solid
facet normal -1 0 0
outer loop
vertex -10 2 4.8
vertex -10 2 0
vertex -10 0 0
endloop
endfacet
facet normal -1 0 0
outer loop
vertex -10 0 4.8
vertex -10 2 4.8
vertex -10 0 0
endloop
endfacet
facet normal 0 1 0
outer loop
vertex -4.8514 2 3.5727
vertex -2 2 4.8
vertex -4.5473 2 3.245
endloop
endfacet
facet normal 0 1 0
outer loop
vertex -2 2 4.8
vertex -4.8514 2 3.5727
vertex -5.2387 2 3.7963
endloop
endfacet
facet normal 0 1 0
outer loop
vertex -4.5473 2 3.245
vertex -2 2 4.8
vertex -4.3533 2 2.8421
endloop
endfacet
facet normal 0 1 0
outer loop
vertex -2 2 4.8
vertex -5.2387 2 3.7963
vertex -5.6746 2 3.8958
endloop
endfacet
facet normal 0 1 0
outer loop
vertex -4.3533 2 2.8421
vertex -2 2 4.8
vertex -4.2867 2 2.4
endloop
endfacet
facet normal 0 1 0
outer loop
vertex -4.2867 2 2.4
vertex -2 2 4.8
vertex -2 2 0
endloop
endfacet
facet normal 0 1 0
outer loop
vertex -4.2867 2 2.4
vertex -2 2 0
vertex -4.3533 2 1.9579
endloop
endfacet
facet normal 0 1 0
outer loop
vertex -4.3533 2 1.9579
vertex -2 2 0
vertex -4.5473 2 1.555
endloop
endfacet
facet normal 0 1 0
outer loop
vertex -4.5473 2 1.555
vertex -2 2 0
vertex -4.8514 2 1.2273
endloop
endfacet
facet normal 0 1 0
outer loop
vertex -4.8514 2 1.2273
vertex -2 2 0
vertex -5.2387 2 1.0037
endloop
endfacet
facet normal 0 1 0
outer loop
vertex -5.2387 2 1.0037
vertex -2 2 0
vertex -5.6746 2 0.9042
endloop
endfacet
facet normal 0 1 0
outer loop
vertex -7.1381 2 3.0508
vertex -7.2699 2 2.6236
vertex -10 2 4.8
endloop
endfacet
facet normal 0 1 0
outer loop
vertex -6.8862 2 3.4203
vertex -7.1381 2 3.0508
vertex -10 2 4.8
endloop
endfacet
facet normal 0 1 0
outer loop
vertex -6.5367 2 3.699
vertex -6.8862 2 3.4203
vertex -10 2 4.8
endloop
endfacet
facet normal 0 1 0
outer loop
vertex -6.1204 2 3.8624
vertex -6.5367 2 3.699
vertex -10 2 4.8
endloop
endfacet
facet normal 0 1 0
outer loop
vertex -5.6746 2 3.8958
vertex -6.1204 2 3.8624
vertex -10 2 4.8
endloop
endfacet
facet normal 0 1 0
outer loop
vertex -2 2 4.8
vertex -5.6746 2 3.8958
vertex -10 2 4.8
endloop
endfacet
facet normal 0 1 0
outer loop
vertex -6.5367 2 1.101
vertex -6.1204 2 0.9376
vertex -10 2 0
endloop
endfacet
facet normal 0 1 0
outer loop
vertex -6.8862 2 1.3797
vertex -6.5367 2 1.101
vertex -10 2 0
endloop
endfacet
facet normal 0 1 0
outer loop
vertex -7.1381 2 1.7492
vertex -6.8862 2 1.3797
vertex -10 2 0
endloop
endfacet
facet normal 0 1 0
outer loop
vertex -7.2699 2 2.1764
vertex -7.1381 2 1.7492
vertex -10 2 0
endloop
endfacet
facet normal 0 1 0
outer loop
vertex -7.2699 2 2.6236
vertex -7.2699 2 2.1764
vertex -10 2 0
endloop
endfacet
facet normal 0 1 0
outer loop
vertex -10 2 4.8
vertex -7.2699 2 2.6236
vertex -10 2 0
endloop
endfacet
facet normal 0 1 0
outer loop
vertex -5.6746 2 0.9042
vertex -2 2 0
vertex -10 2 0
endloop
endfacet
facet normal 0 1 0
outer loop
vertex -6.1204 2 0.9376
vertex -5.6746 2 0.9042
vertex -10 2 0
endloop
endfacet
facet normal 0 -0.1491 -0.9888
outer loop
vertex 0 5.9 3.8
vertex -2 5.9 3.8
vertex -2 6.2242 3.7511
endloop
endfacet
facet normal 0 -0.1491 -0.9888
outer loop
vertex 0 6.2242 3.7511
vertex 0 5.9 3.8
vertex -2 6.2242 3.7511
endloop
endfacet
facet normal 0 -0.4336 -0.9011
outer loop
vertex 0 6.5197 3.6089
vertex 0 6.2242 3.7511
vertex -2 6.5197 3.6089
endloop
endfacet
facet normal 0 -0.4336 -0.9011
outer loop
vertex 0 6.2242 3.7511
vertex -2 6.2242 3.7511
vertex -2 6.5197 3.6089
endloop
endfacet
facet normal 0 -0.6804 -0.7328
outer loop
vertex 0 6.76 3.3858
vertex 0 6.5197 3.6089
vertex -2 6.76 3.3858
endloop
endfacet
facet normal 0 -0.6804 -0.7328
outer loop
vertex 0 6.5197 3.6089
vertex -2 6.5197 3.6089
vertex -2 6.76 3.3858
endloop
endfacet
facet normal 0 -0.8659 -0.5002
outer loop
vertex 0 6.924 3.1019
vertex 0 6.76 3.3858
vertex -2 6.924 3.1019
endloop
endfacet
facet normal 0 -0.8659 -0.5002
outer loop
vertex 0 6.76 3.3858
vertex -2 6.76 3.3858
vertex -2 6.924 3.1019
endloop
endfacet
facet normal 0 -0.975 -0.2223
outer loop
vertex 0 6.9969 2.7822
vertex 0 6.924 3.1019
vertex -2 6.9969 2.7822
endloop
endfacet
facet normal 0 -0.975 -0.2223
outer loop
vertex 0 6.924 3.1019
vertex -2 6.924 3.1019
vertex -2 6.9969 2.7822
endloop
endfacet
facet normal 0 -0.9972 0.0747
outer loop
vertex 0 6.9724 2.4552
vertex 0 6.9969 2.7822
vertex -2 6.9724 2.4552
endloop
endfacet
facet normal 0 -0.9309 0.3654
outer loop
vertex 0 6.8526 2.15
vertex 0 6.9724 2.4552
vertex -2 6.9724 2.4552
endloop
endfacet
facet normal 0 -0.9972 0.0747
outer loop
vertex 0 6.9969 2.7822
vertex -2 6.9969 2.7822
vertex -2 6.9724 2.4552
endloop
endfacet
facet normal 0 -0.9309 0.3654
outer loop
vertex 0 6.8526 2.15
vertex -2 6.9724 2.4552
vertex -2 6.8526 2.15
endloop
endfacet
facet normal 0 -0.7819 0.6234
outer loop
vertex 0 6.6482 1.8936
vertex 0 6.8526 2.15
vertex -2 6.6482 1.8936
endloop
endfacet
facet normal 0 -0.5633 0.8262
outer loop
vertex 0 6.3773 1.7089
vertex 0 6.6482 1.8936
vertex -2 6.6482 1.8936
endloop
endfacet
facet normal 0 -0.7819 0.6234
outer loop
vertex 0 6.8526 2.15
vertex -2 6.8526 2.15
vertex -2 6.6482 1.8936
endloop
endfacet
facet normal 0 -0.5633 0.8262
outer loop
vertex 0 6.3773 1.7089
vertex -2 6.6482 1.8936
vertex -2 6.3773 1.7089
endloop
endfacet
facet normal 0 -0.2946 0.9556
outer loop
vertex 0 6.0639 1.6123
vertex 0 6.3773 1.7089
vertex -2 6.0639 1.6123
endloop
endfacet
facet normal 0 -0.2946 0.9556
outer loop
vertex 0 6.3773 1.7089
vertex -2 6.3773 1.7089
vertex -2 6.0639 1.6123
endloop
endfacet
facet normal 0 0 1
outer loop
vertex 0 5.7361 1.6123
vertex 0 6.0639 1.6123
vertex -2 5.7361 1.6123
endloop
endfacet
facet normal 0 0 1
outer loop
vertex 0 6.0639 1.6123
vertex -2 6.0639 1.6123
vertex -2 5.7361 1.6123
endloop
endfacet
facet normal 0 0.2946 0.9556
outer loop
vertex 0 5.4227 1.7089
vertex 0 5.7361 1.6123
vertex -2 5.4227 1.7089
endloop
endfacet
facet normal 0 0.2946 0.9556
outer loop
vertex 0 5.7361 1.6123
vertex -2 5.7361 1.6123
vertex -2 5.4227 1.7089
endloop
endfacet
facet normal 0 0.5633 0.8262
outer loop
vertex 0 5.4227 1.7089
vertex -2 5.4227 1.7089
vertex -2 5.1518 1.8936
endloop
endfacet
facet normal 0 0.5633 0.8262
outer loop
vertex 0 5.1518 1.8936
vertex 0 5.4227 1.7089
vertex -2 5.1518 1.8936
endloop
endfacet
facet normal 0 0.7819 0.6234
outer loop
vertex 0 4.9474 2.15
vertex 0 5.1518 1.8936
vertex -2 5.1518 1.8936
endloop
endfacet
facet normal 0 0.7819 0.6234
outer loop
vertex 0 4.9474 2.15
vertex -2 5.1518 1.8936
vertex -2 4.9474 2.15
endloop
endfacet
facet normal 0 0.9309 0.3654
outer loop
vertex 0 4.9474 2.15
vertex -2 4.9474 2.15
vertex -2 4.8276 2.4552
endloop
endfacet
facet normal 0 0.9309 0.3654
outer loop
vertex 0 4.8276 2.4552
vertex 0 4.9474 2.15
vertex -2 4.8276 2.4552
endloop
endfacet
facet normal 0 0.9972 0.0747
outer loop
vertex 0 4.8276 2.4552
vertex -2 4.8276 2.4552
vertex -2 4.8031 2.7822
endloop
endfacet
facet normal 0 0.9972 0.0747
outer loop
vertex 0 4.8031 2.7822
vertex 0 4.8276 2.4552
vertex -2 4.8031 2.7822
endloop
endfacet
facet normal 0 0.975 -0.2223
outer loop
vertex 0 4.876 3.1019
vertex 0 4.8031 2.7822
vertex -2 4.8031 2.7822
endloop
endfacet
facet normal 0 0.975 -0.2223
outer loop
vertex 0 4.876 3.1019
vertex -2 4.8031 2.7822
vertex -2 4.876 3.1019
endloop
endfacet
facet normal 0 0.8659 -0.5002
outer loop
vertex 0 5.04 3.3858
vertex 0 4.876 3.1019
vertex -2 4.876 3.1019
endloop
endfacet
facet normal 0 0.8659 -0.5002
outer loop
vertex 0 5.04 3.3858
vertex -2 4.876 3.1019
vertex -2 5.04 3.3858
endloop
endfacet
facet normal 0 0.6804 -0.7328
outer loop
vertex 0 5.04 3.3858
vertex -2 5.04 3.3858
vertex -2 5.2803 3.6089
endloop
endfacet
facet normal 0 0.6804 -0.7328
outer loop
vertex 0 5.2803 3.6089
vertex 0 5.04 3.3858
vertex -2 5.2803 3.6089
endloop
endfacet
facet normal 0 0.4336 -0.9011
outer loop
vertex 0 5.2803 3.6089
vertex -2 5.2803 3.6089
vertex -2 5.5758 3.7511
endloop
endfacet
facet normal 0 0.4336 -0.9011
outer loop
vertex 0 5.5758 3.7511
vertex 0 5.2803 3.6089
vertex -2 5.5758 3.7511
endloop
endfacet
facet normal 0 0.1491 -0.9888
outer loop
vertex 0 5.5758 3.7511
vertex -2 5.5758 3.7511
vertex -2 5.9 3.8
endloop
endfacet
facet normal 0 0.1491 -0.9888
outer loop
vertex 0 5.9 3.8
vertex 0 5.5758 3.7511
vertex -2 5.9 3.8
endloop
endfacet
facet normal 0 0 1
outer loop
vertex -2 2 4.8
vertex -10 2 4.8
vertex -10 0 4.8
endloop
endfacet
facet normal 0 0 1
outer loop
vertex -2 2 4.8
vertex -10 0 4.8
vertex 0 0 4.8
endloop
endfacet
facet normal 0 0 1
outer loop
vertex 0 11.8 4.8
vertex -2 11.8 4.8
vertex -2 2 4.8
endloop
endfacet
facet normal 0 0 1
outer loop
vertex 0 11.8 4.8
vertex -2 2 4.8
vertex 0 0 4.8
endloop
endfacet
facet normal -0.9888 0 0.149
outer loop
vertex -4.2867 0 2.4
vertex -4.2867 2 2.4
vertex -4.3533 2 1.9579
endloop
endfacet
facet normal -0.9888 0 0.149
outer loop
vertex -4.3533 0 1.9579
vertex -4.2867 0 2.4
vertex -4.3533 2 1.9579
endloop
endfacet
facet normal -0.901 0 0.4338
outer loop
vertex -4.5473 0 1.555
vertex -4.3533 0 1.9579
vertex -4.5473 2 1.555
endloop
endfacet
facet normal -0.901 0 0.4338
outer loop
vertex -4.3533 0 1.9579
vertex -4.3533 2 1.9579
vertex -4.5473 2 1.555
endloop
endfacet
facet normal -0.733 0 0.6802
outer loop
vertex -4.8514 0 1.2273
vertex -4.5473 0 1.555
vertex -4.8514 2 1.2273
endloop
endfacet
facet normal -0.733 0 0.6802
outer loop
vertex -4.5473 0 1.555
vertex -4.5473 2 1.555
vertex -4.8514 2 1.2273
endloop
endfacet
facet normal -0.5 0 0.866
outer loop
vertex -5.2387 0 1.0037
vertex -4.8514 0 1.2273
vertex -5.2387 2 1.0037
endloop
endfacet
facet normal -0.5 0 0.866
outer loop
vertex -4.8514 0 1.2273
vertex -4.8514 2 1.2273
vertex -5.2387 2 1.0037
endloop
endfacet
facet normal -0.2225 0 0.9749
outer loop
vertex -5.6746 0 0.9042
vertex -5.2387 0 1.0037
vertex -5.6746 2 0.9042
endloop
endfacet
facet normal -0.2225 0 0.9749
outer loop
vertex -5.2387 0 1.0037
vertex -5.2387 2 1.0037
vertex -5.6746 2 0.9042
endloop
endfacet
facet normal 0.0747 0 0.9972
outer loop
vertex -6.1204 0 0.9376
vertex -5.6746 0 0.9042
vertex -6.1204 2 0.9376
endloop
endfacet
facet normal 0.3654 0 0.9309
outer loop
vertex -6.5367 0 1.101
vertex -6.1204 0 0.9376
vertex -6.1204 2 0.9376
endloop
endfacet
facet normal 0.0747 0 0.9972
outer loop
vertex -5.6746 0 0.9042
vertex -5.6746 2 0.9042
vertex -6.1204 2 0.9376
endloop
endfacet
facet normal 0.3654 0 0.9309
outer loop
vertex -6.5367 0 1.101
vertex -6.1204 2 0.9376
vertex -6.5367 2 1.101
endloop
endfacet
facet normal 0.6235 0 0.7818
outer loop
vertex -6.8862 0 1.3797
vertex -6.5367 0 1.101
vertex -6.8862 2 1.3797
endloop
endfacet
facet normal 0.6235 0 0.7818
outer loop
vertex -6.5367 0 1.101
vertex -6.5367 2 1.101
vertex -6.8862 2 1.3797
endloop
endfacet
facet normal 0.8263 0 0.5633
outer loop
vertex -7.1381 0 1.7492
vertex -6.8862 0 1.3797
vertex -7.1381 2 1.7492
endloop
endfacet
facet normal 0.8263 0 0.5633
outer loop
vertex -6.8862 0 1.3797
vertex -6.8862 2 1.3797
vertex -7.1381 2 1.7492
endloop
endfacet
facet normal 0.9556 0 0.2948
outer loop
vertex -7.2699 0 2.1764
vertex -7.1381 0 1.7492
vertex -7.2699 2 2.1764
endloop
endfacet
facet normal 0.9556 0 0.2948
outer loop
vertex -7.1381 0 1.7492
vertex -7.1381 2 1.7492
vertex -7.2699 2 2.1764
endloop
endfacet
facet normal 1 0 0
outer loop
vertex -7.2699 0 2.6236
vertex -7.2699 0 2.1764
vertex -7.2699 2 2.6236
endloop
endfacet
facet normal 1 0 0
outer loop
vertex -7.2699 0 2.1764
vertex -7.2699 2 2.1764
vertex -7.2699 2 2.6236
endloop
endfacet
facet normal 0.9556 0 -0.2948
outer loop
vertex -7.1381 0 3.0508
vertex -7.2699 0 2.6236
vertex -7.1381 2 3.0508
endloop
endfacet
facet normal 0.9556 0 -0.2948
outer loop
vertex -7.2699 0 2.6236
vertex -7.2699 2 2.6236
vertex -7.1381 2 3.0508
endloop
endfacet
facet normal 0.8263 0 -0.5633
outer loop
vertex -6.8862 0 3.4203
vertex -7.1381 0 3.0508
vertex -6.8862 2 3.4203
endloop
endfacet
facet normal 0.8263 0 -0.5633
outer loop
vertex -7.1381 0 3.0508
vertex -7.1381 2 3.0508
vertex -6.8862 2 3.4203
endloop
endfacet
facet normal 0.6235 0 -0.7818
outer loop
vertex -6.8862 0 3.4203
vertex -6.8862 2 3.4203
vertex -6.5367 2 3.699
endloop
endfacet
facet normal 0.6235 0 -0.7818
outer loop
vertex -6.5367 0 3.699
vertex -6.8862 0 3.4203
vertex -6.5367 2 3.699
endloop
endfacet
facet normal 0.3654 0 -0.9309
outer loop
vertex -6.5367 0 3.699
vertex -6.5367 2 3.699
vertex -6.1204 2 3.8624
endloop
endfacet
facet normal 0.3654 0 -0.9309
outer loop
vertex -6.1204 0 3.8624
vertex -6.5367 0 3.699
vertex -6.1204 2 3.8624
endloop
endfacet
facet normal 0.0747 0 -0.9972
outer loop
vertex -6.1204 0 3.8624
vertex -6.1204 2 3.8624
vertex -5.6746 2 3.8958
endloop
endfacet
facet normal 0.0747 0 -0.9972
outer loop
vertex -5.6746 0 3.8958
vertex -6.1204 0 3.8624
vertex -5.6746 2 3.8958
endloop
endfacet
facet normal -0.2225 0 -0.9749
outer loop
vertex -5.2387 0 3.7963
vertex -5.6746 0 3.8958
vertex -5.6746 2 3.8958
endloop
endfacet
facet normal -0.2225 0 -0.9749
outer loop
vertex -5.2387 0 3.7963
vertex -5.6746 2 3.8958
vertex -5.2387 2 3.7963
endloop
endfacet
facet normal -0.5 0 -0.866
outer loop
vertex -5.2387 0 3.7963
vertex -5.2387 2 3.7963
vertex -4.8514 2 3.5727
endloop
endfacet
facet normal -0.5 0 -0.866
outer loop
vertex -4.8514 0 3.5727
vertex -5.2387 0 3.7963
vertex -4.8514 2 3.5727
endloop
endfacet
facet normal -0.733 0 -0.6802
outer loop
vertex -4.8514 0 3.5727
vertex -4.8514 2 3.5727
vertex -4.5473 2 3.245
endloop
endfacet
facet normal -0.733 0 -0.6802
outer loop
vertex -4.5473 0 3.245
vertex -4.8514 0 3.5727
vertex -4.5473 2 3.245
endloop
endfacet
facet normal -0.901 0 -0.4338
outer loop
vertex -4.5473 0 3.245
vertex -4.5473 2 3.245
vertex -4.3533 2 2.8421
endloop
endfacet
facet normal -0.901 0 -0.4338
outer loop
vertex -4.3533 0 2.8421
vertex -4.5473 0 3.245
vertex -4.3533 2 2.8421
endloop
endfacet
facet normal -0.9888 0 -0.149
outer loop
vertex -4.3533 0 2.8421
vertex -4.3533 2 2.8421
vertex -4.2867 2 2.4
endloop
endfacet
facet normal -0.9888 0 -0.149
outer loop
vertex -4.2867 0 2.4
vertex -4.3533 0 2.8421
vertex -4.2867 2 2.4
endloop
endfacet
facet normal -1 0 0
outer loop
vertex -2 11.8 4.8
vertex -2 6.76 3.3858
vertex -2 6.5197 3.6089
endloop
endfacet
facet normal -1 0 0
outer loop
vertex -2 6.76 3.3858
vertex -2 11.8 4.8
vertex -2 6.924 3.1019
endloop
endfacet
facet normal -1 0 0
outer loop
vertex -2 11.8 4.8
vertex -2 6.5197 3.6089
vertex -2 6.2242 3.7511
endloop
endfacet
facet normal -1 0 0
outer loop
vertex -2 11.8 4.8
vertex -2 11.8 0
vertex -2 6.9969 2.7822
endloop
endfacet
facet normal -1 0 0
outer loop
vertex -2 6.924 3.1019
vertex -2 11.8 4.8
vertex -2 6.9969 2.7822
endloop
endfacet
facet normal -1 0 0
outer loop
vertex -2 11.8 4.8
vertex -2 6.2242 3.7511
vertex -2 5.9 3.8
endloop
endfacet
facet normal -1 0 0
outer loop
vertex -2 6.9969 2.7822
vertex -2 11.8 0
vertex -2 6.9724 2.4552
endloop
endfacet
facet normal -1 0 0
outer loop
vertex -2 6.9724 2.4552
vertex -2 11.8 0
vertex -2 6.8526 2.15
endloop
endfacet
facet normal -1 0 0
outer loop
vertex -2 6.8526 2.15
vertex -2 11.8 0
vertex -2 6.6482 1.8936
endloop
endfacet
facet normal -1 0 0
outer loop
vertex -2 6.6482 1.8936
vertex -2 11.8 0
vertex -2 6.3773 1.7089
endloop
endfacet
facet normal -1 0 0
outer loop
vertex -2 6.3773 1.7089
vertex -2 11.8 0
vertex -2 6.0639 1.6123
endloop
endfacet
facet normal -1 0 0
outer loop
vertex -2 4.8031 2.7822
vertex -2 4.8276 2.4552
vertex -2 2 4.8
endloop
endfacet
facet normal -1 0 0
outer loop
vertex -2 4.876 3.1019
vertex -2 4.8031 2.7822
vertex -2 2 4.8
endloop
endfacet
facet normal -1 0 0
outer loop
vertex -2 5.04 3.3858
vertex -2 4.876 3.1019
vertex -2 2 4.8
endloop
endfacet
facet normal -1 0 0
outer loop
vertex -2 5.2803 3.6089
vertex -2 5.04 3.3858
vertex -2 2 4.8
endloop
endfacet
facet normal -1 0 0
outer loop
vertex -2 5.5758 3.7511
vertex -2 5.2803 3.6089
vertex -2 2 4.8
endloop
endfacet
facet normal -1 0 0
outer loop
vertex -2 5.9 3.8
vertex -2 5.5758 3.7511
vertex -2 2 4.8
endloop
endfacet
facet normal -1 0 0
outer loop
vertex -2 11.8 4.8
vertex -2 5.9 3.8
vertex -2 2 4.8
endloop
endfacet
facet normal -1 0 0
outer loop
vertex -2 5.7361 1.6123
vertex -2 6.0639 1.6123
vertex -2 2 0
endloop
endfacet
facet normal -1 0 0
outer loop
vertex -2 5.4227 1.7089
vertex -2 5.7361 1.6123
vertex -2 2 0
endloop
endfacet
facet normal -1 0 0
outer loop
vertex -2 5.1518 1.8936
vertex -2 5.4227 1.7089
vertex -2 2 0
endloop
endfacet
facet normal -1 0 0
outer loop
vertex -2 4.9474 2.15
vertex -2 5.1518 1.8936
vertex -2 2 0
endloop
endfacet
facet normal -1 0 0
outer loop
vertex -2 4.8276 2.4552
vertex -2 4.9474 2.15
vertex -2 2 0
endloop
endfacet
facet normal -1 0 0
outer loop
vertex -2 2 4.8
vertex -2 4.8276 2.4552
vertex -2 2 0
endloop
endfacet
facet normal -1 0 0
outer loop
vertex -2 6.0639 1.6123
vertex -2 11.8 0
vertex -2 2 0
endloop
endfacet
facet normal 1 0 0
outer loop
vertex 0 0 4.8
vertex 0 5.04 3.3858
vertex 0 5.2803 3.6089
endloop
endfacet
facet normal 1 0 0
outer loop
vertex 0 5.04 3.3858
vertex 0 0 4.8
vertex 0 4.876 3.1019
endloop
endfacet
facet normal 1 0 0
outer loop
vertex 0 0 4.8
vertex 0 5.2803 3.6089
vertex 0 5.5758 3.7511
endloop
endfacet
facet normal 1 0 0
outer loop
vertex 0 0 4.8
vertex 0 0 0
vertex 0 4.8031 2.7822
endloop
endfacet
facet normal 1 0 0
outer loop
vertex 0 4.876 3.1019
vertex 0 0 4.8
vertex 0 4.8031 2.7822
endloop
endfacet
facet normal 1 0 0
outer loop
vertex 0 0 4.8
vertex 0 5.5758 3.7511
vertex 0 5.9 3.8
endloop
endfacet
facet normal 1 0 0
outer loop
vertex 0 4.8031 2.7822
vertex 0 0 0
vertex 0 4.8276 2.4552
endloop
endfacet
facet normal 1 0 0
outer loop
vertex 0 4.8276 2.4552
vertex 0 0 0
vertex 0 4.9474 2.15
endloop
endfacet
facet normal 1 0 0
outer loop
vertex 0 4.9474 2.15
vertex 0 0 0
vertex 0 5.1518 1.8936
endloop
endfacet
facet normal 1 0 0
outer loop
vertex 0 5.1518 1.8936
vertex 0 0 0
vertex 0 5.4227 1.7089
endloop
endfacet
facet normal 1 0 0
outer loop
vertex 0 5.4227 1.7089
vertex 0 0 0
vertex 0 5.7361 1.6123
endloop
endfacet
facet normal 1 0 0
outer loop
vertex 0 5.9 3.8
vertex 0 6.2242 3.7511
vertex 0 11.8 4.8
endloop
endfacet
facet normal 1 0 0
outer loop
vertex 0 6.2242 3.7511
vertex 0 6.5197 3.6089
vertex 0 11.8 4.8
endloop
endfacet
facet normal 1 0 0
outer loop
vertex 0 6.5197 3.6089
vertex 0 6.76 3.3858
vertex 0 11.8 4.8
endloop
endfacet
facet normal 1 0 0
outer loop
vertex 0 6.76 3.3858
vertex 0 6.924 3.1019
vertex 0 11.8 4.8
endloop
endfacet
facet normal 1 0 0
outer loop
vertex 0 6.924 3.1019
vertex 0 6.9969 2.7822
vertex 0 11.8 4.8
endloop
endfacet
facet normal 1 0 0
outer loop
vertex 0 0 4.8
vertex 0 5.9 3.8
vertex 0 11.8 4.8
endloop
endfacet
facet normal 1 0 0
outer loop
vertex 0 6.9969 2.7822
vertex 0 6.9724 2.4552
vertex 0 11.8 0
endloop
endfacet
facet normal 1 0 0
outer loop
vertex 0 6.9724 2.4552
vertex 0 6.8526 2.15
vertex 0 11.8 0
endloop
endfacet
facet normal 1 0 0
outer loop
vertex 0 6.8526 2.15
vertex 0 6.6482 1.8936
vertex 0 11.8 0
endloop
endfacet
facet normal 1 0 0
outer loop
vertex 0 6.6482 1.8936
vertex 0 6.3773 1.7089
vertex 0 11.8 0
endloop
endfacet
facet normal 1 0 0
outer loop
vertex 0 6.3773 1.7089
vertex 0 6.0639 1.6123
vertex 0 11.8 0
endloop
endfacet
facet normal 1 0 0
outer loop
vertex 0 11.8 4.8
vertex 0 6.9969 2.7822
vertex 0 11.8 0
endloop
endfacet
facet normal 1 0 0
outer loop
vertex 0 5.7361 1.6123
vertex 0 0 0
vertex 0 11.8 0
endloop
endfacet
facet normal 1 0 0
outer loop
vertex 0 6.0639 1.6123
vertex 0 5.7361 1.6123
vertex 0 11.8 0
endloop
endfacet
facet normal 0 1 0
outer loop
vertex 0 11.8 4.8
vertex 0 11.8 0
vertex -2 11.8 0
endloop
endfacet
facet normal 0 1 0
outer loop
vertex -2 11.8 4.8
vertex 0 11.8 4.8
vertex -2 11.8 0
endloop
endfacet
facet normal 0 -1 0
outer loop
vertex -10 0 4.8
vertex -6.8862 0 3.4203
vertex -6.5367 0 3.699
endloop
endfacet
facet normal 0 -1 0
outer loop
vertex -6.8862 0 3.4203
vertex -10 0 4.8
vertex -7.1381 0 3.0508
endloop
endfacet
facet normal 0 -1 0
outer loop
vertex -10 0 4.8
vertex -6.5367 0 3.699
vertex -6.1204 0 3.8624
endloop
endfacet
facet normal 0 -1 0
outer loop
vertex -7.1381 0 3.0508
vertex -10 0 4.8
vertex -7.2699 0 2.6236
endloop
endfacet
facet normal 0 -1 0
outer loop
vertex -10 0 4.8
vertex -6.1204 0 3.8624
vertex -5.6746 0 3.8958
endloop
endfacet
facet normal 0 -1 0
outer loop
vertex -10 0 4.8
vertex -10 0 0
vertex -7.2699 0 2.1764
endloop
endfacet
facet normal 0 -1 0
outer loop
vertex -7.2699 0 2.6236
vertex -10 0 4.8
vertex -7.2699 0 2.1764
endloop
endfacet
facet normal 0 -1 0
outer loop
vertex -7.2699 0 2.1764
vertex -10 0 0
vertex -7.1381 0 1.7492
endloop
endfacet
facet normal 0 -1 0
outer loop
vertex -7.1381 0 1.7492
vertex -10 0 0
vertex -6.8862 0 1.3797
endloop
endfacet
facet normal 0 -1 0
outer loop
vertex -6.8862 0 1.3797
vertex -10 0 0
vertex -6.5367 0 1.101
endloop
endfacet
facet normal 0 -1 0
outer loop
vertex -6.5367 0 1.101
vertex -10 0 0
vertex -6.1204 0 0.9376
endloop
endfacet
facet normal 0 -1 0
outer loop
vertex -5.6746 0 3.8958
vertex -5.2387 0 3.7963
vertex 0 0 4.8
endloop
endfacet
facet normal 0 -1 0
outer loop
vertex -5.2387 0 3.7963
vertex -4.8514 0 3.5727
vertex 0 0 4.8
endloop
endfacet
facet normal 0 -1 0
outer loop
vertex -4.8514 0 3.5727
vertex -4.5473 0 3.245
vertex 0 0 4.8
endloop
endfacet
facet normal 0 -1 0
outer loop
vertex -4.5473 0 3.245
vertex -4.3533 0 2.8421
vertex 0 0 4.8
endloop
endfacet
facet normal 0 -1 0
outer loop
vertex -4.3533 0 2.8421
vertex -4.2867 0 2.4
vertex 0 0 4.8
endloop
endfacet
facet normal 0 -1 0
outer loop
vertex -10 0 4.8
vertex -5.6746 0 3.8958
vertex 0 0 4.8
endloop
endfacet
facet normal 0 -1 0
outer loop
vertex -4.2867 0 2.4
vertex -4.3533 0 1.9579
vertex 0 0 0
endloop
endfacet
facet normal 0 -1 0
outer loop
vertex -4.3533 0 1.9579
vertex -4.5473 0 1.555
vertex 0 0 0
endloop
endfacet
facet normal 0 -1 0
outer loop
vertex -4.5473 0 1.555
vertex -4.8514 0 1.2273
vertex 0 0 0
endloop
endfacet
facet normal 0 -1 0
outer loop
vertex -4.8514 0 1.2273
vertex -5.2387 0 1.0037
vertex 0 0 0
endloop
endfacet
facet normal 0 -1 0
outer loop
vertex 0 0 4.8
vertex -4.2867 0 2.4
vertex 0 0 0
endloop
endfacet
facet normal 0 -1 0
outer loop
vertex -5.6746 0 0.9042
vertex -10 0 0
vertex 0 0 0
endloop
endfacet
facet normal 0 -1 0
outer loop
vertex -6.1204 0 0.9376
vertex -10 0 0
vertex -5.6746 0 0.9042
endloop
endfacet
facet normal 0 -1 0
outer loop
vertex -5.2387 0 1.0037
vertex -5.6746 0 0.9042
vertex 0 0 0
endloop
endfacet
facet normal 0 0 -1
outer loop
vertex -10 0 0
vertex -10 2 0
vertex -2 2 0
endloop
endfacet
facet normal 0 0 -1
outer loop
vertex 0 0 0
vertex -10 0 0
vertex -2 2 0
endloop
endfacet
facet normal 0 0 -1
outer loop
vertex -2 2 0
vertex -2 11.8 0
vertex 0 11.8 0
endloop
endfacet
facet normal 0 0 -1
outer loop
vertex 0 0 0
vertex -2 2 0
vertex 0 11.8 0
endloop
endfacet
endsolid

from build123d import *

# Parameters (mm, degrees)
BOSS_EXTRUDE1_DEPTH = 4.8
CUT_EXTRUDE1_REACH  = 4
SKETCH2_R           = 1.1
CUT_EXTRUDE2_REACH  = 4
SKETCH3_R           = 1.5


with BuildPart() as part:
    # Sketch1 → Boss-Extrude1 (new body)
    with BuildSketch(Plane.XY):
        Polygon((0, 0), (0, 11.8), (-2, 11.8), (-2, 2), (-10, 2), (-10, 0), align=None)
    extrude(amount=BOSS_EXTRUDE1_DEPTH)

    # Sketch2 → Cut-Extrude1 (cut, up to next)
    with BuildSketch(Plane.ZY.offset(2), mode=Mode.PRIVATE) as cut_extrude1_sk1:
        with Locations((2.7, 5.9)):
            Circle(SKETCH2_R)
    cut_extrude1_tool1 = extrude(cut_extrude1_sk1.sketch, amount=-CUT_EXTRUDE1_REACH, mode=Mode.PRIVATE) & part.part
    add(cut_extrude1_tool1.solids().sort_by_distance((-2, 5.9, 2.7))[0], mode=Mode.SUBTRACT)

    # Sketch3 → Cut-Extrude2 (cut, up to next)
    with BuildSketch(Plane(origin=(0, 2, 0), x_dir=(1, 0, 0), z_dir=(0, 1, 0)), mode=Mode.PRIVATE) as cut_extrude2_sk1:
        with Locations((-5.786663097, -2.4)):
            Circle(SKETCH3_R)
    cut_extrude2_tool1 = extrude(cut_extrude2_sk1.sketch, amount=-CUT_EXTRUDE2_REACH, mode=Mode.PRIVATE) & part.part
    add(cut_extrude2_tool1.solids().sort_by_distance((-5.786663, 2, 2.4))[0], mode=Mode.SUBTRACT)


solid = part.part
